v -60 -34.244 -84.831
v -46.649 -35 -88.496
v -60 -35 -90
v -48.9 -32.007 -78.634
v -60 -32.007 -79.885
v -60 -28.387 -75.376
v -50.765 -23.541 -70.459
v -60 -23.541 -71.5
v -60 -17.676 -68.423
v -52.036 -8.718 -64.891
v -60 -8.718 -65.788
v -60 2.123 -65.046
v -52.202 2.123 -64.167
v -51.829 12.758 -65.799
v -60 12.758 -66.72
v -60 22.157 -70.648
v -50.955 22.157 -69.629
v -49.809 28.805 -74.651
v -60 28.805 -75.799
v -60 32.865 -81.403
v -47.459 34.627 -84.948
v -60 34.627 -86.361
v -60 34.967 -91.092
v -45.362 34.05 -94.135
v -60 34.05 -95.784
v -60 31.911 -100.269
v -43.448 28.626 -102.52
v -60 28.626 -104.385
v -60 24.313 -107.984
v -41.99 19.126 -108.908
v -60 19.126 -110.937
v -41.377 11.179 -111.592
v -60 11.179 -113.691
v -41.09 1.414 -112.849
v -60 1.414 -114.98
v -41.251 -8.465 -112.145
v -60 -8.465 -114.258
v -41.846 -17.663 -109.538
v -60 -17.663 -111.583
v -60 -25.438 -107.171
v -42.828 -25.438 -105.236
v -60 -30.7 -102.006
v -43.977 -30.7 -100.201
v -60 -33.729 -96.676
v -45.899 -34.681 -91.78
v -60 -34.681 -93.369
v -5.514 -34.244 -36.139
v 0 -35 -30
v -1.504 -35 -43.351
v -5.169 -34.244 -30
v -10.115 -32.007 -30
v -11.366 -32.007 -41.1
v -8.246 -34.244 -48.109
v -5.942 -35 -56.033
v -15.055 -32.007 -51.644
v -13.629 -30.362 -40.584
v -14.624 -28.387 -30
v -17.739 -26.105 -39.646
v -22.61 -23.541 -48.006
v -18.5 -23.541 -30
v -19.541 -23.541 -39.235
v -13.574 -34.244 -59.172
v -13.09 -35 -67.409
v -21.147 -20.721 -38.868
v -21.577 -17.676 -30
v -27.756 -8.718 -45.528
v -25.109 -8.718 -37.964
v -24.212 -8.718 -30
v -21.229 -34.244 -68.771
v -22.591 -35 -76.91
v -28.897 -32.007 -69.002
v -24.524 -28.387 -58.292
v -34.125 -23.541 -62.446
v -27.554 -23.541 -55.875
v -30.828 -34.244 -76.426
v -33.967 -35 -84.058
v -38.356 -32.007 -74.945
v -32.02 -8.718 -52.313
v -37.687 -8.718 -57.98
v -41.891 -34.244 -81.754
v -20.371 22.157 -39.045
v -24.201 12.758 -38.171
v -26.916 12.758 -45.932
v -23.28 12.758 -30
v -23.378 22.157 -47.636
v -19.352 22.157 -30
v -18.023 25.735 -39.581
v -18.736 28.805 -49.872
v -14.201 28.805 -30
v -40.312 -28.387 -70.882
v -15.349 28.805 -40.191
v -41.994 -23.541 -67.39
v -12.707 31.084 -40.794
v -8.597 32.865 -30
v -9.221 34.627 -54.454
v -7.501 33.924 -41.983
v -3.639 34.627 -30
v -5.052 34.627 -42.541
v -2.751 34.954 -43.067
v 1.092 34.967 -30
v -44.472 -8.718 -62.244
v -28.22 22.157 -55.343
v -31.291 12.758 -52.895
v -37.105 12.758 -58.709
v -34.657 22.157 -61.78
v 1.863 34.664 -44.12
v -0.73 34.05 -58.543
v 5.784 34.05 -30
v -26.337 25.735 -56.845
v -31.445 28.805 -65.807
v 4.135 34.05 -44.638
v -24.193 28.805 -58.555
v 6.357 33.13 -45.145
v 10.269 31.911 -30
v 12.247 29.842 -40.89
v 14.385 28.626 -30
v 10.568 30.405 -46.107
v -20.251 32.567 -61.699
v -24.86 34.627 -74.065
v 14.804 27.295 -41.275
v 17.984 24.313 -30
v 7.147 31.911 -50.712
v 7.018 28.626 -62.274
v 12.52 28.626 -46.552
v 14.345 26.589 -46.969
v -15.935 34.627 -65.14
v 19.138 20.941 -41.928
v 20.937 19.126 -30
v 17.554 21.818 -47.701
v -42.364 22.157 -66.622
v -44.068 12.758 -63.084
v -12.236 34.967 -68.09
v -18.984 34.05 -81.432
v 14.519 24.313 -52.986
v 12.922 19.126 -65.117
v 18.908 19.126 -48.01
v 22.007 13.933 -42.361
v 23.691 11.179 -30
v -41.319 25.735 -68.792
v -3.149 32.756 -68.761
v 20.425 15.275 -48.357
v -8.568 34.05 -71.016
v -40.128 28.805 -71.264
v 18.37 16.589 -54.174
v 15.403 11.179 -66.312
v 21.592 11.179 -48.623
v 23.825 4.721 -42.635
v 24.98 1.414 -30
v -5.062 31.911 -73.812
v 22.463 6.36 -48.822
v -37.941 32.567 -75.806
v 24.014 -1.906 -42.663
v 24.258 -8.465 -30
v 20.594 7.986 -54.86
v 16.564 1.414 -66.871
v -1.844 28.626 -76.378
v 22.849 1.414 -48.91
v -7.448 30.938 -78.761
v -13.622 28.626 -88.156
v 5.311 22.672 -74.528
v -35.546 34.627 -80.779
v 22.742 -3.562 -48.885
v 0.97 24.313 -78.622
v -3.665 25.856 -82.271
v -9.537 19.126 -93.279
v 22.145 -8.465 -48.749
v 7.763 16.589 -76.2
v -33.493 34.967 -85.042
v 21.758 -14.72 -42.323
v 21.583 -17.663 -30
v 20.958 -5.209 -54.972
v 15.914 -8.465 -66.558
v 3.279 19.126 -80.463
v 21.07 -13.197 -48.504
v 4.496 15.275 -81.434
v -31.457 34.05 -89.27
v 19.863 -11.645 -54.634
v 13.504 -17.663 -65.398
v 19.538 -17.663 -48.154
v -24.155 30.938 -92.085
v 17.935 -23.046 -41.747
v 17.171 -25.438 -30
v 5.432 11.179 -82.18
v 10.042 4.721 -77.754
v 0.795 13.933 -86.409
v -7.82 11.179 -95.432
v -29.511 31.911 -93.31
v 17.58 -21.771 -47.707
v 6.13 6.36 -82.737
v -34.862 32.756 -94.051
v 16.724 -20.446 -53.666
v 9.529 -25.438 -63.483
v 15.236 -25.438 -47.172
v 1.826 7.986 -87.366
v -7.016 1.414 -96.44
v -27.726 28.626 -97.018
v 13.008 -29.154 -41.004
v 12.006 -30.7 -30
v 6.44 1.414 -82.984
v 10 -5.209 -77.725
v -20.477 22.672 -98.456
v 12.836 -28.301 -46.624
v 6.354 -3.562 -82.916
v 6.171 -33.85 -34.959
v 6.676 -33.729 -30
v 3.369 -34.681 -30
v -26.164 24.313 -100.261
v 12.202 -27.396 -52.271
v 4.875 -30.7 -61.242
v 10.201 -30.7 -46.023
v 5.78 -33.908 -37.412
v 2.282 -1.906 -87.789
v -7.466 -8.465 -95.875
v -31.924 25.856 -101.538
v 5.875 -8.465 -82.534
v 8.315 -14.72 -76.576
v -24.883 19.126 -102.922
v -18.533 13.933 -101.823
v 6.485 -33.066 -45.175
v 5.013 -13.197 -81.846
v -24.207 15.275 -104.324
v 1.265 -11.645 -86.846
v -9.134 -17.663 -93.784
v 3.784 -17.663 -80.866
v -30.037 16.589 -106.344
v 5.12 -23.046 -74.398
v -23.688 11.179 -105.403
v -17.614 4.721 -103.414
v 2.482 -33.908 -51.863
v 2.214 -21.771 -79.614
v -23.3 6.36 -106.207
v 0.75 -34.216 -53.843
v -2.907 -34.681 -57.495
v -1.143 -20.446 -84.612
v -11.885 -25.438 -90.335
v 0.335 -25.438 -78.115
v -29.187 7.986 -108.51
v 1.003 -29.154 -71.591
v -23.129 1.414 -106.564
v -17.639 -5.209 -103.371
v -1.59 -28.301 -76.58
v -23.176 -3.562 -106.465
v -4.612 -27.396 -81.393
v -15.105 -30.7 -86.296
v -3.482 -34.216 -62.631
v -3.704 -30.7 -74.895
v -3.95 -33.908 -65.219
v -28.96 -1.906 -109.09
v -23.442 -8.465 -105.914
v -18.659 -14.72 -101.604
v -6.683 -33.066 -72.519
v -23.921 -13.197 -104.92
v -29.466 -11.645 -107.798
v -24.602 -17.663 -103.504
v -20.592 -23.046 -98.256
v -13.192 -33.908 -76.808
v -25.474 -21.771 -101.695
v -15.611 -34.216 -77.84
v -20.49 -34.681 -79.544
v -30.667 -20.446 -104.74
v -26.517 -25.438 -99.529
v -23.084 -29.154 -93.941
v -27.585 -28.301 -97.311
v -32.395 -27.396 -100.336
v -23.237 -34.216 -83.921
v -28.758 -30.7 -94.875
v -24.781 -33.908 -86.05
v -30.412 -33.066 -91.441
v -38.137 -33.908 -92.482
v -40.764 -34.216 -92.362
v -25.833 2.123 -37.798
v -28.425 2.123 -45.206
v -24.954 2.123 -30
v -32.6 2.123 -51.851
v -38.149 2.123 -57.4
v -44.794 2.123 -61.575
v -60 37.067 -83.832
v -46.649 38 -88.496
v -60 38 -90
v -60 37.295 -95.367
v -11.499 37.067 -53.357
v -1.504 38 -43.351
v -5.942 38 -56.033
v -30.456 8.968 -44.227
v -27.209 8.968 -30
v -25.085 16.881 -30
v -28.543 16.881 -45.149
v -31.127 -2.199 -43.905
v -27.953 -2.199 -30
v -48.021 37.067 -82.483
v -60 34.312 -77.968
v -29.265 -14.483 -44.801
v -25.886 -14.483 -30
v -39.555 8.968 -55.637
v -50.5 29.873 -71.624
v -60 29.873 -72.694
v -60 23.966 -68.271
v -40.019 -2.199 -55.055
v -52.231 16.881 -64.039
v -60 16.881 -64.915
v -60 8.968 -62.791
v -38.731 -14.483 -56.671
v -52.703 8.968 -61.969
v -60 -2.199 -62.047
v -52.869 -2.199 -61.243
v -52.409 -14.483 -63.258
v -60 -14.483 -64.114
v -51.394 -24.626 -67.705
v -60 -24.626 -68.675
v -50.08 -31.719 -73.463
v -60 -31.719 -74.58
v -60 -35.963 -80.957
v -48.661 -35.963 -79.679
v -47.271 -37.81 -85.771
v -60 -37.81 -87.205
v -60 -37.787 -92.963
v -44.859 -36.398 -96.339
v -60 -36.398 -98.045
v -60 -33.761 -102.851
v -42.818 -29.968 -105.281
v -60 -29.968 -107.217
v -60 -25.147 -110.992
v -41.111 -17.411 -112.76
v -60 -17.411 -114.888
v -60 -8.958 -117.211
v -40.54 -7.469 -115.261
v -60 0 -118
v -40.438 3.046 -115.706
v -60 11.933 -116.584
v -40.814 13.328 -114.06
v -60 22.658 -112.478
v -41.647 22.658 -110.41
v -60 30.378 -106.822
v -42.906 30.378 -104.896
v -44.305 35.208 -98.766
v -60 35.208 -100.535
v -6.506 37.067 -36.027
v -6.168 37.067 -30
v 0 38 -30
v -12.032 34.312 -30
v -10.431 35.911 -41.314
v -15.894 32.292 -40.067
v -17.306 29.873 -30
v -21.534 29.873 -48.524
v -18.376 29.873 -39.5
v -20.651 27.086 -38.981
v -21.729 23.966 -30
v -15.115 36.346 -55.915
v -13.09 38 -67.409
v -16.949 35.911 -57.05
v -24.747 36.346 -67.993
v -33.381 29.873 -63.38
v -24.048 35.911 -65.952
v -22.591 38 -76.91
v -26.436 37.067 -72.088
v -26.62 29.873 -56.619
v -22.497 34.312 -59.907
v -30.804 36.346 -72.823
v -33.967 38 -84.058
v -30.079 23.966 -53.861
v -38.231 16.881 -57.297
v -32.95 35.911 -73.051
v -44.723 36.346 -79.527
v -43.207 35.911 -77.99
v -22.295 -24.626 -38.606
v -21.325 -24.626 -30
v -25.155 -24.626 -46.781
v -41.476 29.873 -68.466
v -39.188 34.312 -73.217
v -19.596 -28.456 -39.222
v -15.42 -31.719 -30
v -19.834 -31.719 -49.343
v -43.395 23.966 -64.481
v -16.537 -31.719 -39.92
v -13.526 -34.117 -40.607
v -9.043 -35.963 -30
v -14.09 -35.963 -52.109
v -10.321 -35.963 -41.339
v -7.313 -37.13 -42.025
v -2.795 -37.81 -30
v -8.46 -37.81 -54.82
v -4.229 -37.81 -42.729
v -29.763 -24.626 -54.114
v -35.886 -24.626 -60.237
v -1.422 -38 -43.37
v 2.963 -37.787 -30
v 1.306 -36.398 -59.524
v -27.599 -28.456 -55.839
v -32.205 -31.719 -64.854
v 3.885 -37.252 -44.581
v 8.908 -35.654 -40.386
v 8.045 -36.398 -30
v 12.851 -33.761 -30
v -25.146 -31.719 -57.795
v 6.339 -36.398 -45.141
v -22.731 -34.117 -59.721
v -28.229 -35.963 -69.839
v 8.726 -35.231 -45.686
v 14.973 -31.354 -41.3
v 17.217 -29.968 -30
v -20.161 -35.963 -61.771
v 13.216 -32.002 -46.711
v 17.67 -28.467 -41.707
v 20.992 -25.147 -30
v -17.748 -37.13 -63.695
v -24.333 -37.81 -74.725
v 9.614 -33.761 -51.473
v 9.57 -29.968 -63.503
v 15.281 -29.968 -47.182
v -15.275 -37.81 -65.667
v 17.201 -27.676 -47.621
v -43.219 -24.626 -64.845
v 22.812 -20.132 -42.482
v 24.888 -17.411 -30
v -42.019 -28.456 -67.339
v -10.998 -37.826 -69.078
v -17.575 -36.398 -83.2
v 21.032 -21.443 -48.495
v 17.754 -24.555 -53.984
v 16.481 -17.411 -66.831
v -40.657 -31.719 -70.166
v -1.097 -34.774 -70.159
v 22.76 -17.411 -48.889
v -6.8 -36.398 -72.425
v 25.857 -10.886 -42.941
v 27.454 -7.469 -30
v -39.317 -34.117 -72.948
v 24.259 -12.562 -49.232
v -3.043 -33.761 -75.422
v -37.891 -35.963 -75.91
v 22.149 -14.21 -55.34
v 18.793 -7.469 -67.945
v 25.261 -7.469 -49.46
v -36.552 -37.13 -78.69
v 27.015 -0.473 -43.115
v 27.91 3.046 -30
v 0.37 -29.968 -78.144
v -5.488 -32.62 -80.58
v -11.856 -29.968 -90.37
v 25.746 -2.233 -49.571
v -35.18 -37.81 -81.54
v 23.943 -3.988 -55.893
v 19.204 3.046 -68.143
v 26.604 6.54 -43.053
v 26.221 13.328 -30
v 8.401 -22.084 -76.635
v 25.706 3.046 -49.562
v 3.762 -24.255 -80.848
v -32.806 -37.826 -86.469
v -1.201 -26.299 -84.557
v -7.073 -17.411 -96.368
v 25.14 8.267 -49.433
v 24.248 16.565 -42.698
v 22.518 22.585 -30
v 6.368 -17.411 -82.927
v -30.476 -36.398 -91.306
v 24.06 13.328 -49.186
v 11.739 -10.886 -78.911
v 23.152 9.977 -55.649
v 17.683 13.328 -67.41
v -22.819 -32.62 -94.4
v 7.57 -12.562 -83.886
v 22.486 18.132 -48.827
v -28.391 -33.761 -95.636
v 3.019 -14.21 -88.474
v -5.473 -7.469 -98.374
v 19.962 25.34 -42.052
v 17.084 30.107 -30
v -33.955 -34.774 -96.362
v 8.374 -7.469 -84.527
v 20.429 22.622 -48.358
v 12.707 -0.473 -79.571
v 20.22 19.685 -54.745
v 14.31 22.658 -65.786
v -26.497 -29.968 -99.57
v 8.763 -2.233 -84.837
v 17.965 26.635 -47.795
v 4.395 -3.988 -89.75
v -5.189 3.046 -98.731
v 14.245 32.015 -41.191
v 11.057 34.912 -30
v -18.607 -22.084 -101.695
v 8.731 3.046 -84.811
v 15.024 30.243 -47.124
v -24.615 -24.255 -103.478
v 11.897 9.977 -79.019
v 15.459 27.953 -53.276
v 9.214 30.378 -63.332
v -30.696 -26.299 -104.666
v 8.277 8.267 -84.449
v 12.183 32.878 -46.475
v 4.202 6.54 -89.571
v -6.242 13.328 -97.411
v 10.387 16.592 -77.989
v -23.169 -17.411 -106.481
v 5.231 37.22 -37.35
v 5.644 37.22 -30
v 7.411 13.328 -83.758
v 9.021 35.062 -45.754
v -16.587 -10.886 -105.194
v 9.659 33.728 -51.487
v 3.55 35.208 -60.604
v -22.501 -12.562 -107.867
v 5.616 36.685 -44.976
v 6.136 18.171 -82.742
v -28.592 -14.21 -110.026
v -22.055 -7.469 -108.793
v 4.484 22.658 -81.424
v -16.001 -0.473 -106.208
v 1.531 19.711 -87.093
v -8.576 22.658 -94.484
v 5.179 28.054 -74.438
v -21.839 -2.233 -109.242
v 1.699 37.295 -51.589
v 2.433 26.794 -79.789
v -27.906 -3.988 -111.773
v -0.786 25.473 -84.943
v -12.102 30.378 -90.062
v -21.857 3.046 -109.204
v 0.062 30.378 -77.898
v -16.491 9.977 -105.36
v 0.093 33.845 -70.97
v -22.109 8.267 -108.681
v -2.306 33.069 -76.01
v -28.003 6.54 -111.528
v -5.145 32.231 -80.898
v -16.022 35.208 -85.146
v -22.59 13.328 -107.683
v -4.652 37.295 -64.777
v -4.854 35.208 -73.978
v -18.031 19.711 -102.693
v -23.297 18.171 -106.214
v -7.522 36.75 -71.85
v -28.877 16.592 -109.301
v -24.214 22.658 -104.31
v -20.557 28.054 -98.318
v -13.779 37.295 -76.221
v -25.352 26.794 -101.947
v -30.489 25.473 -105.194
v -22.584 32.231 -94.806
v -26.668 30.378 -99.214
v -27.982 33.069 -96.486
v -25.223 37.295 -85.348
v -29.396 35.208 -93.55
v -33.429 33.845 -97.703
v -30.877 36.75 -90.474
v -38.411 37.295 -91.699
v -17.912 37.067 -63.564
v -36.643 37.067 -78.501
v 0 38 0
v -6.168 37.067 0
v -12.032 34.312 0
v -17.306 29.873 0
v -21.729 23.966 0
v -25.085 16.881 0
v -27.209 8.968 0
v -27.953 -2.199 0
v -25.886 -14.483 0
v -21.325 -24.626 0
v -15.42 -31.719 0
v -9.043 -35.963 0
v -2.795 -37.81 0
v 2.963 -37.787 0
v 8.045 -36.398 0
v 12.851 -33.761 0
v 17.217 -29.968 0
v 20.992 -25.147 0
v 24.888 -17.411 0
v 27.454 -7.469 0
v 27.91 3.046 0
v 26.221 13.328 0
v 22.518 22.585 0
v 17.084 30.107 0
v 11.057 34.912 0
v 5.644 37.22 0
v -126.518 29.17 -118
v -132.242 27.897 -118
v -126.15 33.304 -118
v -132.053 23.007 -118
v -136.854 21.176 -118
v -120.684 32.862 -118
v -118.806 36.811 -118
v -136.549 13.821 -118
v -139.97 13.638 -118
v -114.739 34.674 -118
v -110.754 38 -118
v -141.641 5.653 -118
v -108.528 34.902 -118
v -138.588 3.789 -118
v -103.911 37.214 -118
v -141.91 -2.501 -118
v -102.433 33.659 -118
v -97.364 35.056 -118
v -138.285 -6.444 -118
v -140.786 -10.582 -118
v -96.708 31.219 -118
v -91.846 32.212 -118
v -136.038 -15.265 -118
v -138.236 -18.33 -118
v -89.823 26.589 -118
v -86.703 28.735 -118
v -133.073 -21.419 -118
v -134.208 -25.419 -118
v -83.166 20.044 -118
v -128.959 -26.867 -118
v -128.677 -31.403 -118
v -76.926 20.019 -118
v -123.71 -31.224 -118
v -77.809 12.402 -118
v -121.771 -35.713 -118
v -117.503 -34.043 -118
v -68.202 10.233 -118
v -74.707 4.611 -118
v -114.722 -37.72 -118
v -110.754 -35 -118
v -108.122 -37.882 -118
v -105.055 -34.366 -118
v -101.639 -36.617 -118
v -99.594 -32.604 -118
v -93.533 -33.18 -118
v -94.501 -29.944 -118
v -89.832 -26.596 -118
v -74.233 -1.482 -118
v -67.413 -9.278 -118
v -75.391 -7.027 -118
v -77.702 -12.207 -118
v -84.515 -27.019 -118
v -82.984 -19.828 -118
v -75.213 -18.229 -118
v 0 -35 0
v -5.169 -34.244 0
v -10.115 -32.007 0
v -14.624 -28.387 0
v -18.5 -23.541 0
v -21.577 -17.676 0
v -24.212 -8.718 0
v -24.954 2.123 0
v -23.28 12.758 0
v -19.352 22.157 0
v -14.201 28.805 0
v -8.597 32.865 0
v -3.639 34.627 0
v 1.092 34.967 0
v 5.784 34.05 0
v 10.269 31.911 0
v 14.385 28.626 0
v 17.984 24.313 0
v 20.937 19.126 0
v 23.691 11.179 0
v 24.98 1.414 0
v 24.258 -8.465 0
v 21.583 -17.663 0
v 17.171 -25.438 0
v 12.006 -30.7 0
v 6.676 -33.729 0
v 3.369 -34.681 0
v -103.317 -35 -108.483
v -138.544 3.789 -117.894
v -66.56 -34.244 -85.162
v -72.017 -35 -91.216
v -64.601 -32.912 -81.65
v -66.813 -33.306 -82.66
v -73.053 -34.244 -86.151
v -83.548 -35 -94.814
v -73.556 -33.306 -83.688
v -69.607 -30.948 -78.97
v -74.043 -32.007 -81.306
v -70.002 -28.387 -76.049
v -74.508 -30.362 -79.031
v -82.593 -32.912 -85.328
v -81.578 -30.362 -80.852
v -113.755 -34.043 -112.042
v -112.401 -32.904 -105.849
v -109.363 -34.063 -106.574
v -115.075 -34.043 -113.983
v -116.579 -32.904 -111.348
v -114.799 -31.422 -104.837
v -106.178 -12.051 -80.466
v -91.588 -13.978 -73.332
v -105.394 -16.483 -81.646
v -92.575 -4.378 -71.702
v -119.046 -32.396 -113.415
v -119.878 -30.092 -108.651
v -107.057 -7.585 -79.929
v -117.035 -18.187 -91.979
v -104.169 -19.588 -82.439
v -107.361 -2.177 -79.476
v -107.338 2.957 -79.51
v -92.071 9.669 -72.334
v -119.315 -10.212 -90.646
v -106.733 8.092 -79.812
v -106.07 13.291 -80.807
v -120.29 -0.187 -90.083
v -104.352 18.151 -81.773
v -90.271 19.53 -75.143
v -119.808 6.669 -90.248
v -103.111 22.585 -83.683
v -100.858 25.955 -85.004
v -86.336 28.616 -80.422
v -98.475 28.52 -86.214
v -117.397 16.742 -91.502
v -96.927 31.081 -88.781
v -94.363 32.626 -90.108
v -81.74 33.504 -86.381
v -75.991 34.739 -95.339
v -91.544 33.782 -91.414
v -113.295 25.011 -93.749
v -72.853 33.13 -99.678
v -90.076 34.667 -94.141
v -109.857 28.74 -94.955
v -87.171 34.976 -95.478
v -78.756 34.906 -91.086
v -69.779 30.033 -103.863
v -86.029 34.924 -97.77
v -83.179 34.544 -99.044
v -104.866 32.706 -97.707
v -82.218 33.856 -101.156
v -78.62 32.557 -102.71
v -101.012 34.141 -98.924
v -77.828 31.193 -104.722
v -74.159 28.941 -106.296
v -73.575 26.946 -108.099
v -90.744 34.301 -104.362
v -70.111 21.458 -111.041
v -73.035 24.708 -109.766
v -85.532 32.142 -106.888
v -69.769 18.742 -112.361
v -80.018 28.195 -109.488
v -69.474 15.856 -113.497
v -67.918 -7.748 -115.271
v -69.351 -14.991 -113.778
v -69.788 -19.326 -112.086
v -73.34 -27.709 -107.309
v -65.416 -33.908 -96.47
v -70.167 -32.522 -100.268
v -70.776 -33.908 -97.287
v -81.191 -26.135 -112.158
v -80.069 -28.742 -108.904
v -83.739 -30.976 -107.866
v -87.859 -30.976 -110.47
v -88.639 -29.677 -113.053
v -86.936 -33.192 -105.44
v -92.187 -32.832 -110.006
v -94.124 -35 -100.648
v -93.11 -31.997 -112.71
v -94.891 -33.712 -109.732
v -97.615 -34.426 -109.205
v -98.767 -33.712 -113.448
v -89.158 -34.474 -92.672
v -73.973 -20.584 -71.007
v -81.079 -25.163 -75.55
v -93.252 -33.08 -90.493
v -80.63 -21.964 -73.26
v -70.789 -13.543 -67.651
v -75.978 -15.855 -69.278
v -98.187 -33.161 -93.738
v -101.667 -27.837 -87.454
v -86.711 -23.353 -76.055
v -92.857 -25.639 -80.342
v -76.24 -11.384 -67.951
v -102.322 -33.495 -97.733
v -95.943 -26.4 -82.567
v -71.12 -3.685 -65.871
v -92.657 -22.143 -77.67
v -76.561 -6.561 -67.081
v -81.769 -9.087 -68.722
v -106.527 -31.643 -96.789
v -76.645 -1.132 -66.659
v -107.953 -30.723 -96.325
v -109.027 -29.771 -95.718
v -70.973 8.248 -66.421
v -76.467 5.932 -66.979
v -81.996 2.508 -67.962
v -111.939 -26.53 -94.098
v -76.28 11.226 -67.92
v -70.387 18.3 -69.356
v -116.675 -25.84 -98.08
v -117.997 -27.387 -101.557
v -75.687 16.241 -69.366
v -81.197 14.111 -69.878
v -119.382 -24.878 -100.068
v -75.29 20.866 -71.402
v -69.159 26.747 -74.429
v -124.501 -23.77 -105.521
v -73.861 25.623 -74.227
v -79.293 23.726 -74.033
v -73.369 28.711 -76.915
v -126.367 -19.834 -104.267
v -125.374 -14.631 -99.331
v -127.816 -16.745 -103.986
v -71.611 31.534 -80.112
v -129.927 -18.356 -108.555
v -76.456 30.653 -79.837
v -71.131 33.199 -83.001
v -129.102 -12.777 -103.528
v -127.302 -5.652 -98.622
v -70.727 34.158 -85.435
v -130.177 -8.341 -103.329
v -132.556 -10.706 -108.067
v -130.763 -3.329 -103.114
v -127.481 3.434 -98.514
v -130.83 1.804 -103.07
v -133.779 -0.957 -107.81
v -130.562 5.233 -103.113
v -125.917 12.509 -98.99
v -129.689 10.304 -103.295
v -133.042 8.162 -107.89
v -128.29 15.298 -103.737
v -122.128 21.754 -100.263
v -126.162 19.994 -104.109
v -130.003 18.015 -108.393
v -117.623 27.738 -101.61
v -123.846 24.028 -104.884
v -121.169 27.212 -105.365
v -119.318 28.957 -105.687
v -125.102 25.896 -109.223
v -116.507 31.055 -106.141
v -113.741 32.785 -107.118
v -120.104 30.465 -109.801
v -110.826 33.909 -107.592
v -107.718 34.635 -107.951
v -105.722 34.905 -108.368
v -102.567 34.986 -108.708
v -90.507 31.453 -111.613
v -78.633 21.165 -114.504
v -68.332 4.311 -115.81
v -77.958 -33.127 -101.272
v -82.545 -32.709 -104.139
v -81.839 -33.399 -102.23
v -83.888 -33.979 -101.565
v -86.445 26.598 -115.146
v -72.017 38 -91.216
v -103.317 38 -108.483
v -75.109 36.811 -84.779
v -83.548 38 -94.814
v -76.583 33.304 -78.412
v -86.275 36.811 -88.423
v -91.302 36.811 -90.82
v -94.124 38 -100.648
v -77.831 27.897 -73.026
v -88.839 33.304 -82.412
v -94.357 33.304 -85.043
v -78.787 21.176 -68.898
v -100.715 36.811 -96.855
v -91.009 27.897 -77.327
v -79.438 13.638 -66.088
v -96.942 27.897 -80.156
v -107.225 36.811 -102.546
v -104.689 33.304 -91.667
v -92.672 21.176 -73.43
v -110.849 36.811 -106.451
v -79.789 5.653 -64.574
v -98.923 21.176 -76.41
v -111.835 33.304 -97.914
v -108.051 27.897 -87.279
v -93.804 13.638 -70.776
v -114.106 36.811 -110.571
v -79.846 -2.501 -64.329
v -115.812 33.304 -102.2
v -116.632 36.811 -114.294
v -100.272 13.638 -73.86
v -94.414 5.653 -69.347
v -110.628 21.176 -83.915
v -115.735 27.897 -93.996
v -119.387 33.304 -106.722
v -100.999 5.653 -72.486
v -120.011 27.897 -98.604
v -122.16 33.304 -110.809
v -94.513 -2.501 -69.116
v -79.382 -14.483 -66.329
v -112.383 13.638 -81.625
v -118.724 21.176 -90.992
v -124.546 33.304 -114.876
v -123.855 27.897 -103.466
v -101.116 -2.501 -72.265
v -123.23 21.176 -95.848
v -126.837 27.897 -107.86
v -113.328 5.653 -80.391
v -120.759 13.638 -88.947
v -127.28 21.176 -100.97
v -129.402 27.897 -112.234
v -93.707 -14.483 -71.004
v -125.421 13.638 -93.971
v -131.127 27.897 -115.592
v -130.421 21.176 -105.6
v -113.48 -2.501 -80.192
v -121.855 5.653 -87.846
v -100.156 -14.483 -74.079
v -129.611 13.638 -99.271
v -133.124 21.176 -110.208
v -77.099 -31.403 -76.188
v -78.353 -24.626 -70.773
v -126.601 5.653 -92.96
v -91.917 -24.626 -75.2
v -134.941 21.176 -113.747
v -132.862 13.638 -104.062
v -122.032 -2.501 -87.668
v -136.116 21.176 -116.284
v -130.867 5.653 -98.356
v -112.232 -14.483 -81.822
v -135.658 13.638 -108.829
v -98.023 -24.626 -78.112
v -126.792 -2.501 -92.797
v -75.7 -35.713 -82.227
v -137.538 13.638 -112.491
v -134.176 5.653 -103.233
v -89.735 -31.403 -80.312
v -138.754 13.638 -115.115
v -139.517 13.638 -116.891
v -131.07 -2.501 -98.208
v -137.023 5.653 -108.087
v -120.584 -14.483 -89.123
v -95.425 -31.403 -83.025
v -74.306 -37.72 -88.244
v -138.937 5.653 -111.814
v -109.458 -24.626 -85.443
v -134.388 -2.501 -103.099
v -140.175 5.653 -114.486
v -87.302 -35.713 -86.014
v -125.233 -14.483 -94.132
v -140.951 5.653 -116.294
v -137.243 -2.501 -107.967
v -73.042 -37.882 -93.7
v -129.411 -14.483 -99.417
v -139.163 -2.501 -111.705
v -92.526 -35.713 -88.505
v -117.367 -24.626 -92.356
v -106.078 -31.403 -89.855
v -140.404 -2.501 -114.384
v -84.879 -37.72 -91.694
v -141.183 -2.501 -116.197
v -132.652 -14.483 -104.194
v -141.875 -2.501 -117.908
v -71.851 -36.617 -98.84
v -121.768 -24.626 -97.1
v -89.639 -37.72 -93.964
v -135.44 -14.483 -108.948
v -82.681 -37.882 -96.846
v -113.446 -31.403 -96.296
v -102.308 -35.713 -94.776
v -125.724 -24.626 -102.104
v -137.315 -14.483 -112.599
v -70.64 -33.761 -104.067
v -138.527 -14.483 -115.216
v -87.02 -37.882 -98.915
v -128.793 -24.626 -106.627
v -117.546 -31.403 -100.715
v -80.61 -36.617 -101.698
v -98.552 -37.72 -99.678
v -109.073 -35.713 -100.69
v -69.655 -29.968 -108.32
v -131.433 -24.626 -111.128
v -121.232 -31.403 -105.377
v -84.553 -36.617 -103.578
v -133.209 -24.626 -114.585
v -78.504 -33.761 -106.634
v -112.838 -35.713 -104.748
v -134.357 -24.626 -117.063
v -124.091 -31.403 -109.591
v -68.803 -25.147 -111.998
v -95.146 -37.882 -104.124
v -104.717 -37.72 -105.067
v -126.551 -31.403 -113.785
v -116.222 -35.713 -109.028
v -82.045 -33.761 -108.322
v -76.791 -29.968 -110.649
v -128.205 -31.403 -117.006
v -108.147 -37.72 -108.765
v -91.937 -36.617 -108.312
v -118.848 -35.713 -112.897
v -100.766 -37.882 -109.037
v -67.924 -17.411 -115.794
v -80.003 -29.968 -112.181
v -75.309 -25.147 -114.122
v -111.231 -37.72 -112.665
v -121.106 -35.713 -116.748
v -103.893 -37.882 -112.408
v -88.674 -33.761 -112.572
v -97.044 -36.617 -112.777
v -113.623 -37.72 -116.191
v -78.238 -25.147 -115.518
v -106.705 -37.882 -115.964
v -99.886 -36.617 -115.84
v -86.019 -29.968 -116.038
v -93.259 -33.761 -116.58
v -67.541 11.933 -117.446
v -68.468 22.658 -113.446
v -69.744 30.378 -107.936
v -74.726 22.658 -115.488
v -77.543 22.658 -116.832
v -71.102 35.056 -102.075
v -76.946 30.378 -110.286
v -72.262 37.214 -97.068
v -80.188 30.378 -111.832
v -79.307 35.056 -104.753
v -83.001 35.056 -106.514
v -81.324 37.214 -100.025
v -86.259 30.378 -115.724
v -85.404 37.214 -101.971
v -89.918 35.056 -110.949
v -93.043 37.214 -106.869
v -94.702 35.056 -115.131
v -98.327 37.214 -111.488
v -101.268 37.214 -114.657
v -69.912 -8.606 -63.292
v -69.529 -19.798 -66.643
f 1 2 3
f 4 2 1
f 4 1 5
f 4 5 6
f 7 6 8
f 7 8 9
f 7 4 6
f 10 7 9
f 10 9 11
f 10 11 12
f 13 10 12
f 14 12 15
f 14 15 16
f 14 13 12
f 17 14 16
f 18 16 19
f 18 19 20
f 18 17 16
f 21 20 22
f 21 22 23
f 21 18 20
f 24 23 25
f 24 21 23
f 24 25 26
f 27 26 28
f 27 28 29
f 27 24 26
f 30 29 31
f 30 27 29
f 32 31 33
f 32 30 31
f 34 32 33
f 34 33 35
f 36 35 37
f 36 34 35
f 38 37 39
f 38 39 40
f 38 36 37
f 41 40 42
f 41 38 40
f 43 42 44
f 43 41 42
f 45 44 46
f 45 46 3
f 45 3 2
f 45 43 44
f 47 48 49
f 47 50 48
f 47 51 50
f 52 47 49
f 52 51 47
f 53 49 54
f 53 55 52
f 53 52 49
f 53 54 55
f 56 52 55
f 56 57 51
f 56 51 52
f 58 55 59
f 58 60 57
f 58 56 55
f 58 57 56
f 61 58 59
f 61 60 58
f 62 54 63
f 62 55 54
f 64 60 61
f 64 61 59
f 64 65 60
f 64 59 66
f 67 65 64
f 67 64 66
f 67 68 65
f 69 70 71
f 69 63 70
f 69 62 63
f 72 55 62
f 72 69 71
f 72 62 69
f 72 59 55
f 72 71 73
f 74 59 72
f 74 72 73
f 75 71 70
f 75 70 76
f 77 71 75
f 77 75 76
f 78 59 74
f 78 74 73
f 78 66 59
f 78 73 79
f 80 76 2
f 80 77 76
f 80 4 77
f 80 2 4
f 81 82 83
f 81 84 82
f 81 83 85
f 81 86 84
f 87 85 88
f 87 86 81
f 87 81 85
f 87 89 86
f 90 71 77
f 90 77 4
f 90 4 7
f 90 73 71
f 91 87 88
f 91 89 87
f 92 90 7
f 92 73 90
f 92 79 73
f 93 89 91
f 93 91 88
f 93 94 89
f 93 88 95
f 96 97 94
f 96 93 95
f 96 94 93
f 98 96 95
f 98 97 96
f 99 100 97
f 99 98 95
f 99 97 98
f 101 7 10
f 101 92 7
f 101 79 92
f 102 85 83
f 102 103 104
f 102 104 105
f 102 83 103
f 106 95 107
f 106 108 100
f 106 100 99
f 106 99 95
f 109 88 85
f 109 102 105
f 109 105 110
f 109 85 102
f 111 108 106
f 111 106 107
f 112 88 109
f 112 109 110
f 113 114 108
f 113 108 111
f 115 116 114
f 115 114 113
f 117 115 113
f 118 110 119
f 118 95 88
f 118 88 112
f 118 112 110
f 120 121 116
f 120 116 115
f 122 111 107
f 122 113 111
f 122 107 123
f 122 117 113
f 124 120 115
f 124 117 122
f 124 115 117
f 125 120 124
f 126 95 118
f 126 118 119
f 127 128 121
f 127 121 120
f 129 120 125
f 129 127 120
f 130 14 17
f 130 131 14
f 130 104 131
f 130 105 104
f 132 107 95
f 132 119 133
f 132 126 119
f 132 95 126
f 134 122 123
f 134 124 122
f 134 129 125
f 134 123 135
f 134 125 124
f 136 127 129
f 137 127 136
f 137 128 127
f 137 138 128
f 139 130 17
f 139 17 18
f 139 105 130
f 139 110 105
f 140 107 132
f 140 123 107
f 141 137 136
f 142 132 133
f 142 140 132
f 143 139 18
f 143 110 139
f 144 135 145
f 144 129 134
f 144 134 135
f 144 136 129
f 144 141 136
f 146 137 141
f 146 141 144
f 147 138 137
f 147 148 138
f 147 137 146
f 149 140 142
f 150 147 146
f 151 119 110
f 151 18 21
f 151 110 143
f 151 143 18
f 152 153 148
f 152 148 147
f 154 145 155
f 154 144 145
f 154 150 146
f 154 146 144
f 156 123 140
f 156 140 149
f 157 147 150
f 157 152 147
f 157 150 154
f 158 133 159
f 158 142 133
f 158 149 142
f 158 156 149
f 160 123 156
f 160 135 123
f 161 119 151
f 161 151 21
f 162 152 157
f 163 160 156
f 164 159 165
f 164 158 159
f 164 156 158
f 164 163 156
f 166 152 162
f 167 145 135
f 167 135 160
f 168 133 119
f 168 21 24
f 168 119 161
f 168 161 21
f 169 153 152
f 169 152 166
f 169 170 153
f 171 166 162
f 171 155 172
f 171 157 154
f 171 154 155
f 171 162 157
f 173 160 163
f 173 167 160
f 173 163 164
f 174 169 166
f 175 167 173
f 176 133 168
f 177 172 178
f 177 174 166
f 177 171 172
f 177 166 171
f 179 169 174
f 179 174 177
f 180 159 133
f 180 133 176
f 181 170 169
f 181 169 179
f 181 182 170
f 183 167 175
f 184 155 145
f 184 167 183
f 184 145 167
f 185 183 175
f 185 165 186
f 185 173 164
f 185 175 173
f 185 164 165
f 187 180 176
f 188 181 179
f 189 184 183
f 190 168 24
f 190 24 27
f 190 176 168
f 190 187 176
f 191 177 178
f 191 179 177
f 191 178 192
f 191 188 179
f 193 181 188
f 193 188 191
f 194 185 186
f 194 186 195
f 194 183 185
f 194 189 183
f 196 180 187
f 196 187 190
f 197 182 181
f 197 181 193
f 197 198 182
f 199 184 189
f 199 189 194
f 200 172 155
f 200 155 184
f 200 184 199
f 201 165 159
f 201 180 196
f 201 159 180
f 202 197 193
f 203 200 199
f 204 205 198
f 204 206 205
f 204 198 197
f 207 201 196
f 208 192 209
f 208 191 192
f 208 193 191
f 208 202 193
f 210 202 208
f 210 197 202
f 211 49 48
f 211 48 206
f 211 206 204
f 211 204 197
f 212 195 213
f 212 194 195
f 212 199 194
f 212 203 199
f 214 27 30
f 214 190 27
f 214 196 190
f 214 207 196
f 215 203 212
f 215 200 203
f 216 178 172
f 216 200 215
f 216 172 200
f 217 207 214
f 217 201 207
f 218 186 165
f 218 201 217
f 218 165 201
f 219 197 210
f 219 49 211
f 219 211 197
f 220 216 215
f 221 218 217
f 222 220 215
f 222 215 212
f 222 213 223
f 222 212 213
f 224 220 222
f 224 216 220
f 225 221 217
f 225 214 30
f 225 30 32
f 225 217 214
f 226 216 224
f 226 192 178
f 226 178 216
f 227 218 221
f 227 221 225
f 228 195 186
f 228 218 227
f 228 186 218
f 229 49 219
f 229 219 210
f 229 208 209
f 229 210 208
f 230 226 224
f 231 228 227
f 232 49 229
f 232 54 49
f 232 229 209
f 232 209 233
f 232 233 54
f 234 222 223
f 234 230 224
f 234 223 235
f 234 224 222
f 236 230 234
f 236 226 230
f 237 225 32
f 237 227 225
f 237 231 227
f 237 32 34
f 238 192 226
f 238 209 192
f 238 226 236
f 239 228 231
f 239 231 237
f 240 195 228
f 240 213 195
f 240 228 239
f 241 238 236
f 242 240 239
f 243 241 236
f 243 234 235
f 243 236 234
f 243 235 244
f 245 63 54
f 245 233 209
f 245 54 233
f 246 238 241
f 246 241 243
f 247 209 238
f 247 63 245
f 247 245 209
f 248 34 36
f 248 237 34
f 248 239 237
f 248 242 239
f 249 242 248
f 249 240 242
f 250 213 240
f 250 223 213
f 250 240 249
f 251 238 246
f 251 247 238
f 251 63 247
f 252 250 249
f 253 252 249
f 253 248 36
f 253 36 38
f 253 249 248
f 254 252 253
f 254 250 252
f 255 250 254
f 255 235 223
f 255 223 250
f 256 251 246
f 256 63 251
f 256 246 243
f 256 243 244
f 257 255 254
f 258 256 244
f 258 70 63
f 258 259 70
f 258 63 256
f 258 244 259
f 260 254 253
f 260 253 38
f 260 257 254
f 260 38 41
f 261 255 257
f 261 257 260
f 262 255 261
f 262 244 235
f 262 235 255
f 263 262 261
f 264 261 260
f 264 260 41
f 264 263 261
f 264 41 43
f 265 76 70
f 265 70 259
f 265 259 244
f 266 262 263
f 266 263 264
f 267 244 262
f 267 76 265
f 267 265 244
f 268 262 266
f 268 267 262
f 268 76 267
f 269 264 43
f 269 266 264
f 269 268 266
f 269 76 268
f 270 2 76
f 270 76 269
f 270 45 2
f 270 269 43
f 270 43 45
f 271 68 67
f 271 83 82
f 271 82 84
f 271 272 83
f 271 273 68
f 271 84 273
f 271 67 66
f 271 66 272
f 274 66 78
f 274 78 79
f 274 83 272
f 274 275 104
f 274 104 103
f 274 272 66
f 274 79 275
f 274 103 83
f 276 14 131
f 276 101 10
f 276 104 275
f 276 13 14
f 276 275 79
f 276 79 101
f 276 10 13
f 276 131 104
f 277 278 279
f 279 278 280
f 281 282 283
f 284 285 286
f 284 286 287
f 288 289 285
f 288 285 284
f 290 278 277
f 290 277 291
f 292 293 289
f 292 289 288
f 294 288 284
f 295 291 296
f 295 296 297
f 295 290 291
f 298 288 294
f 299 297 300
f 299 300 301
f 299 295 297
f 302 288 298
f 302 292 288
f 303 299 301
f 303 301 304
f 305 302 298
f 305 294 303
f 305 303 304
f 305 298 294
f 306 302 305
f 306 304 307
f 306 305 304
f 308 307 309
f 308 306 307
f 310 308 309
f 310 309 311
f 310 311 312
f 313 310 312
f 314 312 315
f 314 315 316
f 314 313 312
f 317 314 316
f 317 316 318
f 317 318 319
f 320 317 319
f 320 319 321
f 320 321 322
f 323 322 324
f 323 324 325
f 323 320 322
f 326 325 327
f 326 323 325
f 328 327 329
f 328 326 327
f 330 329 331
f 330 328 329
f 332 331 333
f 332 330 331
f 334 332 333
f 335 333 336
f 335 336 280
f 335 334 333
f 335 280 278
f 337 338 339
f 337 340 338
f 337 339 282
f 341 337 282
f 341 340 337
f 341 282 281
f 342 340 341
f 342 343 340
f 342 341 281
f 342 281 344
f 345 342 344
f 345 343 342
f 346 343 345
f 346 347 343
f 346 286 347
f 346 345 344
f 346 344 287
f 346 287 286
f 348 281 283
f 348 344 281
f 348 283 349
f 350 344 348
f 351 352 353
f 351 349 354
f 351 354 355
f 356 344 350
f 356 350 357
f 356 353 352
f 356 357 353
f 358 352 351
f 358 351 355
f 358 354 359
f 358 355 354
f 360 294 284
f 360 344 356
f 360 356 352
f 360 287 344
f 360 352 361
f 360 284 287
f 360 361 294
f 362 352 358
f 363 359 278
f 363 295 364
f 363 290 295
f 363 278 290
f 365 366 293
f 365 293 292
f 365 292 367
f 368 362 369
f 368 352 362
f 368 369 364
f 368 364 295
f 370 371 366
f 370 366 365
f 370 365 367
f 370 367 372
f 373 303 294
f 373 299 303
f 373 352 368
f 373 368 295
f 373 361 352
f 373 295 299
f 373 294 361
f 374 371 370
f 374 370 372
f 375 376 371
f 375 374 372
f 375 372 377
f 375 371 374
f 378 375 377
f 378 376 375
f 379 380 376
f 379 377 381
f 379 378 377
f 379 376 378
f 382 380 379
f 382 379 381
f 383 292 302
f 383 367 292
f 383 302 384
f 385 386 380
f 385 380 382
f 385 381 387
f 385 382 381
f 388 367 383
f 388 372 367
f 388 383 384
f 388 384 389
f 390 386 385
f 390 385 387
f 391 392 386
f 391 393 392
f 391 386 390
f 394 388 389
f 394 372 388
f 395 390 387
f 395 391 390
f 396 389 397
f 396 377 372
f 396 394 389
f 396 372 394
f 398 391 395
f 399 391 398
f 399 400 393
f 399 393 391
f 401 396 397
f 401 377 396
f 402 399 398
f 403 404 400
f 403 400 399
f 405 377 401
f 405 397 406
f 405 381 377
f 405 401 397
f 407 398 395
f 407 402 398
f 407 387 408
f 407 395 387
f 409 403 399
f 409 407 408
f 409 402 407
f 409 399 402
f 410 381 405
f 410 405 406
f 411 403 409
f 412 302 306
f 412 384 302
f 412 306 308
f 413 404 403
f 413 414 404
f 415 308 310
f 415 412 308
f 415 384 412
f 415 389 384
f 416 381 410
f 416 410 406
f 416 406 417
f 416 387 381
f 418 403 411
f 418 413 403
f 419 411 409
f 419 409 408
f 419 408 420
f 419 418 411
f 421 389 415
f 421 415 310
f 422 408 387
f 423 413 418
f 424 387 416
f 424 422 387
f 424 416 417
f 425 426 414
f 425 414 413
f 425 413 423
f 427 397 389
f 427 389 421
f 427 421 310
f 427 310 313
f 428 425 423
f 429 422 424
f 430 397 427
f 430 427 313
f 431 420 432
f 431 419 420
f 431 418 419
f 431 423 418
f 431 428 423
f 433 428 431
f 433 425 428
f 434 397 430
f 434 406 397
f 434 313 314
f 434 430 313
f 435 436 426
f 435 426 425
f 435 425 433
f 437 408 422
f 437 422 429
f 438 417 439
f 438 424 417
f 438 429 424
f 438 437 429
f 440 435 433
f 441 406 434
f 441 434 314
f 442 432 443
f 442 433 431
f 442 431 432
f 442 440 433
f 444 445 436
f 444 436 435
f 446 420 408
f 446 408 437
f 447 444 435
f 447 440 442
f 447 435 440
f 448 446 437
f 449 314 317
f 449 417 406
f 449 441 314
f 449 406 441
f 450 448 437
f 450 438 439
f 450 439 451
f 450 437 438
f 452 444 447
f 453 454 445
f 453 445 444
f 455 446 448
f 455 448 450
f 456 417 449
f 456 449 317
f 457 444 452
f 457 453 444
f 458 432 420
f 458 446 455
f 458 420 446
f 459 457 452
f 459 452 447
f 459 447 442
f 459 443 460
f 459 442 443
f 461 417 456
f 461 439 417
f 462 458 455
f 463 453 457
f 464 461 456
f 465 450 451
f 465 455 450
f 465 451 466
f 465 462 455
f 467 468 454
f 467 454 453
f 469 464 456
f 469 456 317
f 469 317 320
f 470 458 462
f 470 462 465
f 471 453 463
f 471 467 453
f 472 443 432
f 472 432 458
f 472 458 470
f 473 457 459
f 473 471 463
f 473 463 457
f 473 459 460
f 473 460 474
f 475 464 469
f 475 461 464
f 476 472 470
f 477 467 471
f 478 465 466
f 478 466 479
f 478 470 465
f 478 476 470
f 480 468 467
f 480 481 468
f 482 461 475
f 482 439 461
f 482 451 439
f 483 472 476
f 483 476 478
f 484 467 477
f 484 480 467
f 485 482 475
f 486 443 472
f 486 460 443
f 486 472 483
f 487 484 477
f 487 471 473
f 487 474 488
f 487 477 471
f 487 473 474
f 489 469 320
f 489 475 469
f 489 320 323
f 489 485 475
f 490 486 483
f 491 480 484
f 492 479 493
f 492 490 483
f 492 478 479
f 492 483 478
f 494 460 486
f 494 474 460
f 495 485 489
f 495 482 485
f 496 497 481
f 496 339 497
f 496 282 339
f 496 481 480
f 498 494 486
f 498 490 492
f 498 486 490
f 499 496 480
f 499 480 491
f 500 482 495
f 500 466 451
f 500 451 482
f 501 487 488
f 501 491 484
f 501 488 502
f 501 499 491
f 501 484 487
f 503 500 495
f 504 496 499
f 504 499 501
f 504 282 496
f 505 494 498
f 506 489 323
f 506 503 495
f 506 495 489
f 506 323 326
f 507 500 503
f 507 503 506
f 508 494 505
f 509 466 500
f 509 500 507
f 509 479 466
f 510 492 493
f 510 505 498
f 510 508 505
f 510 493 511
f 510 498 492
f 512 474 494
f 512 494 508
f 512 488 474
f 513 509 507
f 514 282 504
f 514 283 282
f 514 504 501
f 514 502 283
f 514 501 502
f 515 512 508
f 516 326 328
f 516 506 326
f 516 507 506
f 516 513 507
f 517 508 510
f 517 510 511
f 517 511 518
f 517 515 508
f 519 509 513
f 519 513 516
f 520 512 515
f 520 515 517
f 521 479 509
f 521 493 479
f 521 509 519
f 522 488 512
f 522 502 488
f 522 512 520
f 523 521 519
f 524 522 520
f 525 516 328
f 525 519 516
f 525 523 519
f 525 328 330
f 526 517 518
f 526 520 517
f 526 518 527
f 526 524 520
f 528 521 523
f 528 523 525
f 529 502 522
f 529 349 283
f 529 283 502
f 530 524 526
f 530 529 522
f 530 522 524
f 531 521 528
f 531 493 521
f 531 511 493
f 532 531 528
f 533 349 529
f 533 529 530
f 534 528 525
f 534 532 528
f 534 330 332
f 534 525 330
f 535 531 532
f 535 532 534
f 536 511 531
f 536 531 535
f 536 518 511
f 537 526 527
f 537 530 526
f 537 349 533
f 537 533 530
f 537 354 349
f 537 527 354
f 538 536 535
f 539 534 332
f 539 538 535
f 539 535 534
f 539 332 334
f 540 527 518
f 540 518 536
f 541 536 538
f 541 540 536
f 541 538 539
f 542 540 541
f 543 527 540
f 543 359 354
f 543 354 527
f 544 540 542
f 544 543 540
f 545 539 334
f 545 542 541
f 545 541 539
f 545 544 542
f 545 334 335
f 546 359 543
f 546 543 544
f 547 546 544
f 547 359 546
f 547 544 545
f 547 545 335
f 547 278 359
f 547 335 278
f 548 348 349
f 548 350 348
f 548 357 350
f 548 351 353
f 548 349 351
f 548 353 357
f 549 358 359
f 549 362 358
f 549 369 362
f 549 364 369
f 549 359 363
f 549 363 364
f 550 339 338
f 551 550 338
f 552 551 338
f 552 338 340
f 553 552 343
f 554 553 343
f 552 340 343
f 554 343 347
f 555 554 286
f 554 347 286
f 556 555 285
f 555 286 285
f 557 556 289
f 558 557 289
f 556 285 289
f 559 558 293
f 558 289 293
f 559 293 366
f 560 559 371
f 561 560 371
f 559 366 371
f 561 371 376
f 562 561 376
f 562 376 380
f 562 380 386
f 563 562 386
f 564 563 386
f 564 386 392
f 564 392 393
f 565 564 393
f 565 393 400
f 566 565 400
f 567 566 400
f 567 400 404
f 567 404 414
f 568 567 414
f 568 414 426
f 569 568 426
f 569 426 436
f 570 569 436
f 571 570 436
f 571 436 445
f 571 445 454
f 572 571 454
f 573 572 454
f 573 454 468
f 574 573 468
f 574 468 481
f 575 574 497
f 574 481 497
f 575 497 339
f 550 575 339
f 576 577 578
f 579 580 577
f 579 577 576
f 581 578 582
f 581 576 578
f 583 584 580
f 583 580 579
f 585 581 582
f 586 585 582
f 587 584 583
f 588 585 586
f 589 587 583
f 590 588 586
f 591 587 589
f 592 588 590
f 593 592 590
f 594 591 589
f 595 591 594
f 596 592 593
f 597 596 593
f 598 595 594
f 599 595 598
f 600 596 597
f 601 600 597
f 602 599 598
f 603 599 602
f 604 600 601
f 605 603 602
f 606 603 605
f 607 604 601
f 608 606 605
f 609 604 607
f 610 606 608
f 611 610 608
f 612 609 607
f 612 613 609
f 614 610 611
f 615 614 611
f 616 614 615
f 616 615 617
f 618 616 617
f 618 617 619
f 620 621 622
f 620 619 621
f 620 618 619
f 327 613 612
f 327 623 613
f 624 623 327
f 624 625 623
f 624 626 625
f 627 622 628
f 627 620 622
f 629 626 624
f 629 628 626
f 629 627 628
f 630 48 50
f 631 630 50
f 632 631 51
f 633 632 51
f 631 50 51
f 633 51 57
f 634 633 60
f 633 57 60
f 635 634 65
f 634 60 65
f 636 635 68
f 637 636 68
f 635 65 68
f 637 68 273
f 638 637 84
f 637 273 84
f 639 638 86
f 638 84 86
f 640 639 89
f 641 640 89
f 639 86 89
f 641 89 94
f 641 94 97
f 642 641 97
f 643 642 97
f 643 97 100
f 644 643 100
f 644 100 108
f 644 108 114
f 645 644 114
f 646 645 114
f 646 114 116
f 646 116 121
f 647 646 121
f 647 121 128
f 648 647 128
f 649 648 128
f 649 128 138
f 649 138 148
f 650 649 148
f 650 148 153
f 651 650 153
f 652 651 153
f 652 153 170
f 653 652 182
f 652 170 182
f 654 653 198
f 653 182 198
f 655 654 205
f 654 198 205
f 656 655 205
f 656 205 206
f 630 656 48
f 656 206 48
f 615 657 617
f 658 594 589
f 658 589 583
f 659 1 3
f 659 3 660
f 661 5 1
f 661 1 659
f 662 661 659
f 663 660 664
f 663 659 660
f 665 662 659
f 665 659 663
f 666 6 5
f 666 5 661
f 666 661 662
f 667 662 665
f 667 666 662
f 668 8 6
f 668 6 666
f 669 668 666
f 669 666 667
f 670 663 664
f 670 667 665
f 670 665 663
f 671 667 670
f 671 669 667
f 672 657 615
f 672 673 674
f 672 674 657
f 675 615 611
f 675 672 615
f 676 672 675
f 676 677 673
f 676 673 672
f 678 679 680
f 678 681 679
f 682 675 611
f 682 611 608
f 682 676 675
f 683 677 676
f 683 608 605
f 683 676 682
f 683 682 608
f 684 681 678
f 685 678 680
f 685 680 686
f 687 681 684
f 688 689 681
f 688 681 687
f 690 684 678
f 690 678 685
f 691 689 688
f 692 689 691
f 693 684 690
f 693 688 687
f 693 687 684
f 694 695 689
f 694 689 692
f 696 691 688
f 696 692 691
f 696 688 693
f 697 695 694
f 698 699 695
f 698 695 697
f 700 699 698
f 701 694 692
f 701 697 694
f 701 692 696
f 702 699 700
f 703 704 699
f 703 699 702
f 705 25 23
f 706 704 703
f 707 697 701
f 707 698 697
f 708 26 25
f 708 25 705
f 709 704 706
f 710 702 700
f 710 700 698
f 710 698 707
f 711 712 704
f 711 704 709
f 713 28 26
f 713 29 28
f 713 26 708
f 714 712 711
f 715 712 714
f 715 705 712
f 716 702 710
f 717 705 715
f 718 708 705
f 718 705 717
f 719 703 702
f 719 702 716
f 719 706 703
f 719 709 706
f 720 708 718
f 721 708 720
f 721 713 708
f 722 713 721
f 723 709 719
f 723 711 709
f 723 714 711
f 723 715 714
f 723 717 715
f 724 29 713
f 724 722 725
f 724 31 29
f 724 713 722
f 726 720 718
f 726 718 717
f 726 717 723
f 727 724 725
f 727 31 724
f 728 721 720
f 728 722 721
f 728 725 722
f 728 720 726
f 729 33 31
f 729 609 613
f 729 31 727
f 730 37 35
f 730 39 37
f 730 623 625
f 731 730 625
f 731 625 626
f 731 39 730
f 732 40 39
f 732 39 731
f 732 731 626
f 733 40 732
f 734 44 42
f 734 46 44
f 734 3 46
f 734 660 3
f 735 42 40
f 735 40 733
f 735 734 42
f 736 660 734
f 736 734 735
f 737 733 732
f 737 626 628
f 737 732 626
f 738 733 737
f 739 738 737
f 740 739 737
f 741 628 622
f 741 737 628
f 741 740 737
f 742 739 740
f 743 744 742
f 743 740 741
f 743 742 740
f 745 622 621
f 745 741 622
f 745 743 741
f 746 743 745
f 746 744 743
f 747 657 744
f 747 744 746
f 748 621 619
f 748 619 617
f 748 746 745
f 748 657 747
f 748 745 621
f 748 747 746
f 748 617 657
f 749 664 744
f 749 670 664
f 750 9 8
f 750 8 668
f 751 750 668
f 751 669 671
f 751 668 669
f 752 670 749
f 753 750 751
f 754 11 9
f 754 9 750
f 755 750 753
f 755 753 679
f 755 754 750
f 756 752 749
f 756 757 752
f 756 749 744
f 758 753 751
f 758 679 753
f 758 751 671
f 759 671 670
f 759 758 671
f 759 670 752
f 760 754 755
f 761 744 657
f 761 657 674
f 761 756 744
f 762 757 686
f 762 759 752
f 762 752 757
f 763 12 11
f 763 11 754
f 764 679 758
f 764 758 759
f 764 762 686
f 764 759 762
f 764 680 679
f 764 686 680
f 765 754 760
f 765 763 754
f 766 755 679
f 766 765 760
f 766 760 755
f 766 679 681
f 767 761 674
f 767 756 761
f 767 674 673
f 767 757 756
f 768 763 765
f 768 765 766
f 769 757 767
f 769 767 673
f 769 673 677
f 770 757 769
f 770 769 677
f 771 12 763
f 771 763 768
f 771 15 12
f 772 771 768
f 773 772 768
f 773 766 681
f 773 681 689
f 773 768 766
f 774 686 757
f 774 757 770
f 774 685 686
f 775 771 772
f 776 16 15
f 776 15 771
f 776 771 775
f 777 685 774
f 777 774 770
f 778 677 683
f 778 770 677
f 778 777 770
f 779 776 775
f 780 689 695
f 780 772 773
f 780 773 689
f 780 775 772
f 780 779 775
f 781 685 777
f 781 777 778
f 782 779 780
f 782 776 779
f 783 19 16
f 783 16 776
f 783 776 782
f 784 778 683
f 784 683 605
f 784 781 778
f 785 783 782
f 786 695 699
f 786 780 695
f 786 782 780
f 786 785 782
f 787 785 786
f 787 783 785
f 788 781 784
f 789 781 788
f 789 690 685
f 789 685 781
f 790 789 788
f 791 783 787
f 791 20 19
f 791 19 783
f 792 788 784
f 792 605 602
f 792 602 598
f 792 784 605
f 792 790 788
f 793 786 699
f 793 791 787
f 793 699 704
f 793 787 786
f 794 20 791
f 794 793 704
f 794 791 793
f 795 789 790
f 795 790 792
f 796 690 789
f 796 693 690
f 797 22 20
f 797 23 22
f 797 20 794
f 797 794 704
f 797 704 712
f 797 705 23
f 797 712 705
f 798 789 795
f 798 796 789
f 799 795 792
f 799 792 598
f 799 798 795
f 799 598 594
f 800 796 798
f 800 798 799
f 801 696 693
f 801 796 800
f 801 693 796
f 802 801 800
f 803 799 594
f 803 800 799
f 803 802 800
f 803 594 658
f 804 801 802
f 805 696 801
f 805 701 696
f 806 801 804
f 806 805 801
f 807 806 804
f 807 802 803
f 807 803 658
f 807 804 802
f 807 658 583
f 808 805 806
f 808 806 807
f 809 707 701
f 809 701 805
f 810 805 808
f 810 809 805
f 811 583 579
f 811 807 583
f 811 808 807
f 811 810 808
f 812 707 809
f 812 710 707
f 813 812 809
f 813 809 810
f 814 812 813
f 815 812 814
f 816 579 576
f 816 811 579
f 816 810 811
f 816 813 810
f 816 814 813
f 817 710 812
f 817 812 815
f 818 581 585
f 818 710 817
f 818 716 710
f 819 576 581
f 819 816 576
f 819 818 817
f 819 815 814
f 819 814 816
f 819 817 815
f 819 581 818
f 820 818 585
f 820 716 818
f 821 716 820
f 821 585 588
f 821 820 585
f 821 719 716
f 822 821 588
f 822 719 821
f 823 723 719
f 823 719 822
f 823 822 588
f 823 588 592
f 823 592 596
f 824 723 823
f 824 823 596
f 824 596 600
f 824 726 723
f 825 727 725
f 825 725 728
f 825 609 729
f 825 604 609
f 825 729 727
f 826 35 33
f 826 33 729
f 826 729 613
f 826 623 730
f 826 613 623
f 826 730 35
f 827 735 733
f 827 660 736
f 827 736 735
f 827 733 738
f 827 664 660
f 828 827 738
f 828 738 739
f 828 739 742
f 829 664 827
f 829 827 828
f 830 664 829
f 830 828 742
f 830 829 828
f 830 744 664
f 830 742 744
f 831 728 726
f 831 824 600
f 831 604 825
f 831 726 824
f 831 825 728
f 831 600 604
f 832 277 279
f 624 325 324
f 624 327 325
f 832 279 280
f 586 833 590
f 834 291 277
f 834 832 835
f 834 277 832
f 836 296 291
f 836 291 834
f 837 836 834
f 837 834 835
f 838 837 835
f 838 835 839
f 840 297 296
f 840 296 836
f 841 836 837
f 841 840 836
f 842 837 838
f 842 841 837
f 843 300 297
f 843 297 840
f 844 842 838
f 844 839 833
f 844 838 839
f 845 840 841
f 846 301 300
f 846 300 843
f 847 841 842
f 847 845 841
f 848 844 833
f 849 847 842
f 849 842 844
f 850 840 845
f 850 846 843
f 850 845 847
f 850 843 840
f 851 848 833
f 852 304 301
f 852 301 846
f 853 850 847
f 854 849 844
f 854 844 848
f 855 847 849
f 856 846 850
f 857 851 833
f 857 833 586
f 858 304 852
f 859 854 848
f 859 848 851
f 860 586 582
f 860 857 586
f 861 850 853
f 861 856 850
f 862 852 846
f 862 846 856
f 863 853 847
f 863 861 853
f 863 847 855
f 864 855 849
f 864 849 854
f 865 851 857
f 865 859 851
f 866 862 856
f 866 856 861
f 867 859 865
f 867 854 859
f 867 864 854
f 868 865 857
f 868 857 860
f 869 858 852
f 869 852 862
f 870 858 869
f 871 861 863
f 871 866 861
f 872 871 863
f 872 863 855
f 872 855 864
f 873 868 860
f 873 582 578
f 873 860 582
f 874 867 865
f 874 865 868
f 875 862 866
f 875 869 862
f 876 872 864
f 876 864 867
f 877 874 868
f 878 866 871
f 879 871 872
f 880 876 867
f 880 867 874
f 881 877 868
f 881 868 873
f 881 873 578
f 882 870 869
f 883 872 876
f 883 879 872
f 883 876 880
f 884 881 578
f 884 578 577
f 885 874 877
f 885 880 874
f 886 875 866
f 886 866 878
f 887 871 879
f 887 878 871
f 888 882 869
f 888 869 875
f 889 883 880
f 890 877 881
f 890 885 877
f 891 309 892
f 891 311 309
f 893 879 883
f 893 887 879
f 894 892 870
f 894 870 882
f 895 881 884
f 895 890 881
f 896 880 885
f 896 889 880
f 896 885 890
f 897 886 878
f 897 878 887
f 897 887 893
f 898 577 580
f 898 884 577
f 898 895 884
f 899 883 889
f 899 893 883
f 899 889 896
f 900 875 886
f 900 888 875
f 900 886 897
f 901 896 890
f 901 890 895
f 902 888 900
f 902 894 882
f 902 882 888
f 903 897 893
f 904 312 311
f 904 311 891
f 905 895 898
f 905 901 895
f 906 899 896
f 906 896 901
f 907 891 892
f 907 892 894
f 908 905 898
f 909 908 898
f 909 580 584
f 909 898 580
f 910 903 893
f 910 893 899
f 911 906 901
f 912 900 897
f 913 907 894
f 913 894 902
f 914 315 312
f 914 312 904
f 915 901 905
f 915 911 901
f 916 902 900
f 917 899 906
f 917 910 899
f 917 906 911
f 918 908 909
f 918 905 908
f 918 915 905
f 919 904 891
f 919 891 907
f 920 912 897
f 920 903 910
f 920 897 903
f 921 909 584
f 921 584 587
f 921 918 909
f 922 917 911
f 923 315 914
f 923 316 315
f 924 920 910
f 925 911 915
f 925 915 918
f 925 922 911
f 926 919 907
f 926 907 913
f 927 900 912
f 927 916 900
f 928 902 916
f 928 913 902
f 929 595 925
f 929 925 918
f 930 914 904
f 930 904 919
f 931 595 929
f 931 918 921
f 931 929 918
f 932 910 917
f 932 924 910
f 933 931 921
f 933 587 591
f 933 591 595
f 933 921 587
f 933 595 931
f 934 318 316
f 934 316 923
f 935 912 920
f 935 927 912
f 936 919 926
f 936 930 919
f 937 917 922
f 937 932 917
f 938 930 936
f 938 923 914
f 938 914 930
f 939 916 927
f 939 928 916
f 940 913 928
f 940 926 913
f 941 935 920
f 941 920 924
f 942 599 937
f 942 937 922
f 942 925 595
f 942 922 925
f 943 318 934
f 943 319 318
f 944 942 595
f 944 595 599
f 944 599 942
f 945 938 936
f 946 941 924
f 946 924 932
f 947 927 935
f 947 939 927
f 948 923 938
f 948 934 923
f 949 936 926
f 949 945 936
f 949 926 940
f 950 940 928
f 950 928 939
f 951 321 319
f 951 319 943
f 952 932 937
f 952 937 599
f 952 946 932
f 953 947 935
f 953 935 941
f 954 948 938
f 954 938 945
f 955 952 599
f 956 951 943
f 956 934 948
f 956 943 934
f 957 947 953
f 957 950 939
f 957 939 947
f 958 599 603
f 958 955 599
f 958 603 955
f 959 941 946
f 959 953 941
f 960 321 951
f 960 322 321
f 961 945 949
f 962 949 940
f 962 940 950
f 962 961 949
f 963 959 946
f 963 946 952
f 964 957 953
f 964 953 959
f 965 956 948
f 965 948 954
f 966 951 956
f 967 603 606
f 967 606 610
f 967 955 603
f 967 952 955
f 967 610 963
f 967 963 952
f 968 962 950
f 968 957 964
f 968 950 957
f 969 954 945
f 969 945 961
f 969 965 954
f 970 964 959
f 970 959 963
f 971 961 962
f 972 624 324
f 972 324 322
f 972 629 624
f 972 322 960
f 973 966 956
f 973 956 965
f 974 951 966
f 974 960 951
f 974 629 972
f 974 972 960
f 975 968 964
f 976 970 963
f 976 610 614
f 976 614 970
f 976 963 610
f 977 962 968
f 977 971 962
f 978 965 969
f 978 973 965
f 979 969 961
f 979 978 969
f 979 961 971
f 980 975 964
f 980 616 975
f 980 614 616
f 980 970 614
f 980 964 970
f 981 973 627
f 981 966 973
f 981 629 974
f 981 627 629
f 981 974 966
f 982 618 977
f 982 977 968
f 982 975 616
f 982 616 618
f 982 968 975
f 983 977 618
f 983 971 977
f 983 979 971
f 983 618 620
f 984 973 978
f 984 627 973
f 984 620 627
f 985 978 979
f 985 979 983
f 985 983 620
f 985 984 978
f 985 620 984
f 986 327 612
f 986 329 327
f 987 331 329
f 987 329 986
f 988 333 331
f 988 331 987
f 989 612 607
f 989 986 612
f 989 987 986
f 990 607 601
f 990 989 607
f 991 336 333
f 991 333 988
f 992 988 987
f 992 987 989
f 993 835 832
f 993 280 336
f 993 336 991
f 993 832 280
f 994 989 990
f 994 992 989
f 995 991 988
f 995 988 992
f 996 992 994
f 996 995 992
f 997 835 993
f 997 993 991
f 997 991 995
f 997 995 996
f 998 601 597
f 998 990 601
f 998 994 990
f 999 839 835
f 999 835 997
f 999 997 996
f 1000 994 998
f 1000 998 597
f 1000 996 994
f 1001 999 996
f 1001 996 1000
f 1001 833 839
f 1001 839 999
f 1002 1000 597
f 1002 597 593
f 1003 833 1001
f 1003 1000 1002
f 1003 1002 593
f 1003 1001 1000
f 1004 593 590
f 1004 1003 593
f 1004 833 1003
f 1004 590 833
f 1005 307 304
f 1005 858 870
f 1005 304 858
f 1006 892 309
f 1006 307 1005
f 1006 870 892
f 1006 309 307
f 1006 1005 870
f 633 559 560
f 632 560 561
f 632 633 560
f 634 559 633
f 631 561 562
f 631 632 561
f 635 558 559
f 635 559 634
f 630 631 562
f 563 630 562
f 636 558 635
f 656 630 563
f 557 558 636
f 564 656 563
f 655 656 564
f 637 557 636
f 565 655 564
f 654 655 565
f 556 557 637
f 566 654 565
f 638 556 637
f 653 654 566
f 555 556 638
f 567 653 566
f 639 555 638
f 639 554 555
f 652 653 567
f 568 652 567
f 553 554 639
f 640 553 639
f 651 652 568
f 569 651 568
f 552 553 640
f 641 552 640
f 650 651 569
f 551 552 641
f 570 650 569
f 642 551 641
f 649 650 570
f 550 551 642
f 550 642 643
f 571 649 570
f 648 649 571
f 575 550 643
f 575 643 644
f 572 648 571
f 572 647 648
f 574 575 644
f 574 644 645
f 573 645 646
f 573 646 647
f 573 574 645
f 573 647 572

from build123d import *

# Parameters (mm, degrees)
CROQUIS2_RX                = 38
CROQUIS2_RY                = 28
CROQUIS2_RX_2              = 35
CROQUIS2_RY_2              = 25
CORTAR_EXTRUIR1_DEPTH      = 50
CORTAR_EXTRUIR1_DEPTH_BACK = 50
CROQUIS21_W                = 114.739521271
CROQUIS21_H                = 36.181021707


with BuildPart() as part:
    # Barrer6: sweep along a path in Croquis3
    with BuildLine(Plane(origin=(0, 0, 0), x_dir=(1, 0, 0), z_dir=(0, 1, 0))) as barrer6_path:
        Line((0, 0), (0, 30))
        ThreePointArc((0, 30), (-17.573593129, 72.426406871), (-60, 90))
        ThreePointArc((-60, 90), (-102.426406871, 107.573593129), (-120, 150))
    # Croquis2 → Barrer6 (sweep)
    with BuildSketch(Plane.XY):
        with Locations(Location((0, 0), (0, 0, 90))):
            Ellipse(CROQUIS2_RX, CROQUIS2_RY)
        with Locations(Location((0, 0), (0, 0, -90))):
            Ellipse(CROQUIS2_RX_2, CROQUIS2_RY_2, mode=Mode.SUBTRACT)
    sweep(path=barrer6_path.line)

    # Croquis21 → Cortar-Extruir1 (cut, two sides: drawn at the far end of the back side and taken through both)
    with BuildSketch(Plane(origin=(0, 0, 0), x_dir=(1, 0, 0), z_dir=(0, 1, 0)).offset(-CORTAR_EXTRUIR1_DEPTH_BACK)):
        with Locations((-117.369760636, 136.090510854)):
            Rectangle(CROQUIS21_W, CROQUIS21_H)
    extrude(amount=CORTAR_EXTRUIR1_DEPTH + CORTAR_EXTRUIR1_DEPTH_BACK, mode=Mode.SUBTRACT)


solid = part.part
